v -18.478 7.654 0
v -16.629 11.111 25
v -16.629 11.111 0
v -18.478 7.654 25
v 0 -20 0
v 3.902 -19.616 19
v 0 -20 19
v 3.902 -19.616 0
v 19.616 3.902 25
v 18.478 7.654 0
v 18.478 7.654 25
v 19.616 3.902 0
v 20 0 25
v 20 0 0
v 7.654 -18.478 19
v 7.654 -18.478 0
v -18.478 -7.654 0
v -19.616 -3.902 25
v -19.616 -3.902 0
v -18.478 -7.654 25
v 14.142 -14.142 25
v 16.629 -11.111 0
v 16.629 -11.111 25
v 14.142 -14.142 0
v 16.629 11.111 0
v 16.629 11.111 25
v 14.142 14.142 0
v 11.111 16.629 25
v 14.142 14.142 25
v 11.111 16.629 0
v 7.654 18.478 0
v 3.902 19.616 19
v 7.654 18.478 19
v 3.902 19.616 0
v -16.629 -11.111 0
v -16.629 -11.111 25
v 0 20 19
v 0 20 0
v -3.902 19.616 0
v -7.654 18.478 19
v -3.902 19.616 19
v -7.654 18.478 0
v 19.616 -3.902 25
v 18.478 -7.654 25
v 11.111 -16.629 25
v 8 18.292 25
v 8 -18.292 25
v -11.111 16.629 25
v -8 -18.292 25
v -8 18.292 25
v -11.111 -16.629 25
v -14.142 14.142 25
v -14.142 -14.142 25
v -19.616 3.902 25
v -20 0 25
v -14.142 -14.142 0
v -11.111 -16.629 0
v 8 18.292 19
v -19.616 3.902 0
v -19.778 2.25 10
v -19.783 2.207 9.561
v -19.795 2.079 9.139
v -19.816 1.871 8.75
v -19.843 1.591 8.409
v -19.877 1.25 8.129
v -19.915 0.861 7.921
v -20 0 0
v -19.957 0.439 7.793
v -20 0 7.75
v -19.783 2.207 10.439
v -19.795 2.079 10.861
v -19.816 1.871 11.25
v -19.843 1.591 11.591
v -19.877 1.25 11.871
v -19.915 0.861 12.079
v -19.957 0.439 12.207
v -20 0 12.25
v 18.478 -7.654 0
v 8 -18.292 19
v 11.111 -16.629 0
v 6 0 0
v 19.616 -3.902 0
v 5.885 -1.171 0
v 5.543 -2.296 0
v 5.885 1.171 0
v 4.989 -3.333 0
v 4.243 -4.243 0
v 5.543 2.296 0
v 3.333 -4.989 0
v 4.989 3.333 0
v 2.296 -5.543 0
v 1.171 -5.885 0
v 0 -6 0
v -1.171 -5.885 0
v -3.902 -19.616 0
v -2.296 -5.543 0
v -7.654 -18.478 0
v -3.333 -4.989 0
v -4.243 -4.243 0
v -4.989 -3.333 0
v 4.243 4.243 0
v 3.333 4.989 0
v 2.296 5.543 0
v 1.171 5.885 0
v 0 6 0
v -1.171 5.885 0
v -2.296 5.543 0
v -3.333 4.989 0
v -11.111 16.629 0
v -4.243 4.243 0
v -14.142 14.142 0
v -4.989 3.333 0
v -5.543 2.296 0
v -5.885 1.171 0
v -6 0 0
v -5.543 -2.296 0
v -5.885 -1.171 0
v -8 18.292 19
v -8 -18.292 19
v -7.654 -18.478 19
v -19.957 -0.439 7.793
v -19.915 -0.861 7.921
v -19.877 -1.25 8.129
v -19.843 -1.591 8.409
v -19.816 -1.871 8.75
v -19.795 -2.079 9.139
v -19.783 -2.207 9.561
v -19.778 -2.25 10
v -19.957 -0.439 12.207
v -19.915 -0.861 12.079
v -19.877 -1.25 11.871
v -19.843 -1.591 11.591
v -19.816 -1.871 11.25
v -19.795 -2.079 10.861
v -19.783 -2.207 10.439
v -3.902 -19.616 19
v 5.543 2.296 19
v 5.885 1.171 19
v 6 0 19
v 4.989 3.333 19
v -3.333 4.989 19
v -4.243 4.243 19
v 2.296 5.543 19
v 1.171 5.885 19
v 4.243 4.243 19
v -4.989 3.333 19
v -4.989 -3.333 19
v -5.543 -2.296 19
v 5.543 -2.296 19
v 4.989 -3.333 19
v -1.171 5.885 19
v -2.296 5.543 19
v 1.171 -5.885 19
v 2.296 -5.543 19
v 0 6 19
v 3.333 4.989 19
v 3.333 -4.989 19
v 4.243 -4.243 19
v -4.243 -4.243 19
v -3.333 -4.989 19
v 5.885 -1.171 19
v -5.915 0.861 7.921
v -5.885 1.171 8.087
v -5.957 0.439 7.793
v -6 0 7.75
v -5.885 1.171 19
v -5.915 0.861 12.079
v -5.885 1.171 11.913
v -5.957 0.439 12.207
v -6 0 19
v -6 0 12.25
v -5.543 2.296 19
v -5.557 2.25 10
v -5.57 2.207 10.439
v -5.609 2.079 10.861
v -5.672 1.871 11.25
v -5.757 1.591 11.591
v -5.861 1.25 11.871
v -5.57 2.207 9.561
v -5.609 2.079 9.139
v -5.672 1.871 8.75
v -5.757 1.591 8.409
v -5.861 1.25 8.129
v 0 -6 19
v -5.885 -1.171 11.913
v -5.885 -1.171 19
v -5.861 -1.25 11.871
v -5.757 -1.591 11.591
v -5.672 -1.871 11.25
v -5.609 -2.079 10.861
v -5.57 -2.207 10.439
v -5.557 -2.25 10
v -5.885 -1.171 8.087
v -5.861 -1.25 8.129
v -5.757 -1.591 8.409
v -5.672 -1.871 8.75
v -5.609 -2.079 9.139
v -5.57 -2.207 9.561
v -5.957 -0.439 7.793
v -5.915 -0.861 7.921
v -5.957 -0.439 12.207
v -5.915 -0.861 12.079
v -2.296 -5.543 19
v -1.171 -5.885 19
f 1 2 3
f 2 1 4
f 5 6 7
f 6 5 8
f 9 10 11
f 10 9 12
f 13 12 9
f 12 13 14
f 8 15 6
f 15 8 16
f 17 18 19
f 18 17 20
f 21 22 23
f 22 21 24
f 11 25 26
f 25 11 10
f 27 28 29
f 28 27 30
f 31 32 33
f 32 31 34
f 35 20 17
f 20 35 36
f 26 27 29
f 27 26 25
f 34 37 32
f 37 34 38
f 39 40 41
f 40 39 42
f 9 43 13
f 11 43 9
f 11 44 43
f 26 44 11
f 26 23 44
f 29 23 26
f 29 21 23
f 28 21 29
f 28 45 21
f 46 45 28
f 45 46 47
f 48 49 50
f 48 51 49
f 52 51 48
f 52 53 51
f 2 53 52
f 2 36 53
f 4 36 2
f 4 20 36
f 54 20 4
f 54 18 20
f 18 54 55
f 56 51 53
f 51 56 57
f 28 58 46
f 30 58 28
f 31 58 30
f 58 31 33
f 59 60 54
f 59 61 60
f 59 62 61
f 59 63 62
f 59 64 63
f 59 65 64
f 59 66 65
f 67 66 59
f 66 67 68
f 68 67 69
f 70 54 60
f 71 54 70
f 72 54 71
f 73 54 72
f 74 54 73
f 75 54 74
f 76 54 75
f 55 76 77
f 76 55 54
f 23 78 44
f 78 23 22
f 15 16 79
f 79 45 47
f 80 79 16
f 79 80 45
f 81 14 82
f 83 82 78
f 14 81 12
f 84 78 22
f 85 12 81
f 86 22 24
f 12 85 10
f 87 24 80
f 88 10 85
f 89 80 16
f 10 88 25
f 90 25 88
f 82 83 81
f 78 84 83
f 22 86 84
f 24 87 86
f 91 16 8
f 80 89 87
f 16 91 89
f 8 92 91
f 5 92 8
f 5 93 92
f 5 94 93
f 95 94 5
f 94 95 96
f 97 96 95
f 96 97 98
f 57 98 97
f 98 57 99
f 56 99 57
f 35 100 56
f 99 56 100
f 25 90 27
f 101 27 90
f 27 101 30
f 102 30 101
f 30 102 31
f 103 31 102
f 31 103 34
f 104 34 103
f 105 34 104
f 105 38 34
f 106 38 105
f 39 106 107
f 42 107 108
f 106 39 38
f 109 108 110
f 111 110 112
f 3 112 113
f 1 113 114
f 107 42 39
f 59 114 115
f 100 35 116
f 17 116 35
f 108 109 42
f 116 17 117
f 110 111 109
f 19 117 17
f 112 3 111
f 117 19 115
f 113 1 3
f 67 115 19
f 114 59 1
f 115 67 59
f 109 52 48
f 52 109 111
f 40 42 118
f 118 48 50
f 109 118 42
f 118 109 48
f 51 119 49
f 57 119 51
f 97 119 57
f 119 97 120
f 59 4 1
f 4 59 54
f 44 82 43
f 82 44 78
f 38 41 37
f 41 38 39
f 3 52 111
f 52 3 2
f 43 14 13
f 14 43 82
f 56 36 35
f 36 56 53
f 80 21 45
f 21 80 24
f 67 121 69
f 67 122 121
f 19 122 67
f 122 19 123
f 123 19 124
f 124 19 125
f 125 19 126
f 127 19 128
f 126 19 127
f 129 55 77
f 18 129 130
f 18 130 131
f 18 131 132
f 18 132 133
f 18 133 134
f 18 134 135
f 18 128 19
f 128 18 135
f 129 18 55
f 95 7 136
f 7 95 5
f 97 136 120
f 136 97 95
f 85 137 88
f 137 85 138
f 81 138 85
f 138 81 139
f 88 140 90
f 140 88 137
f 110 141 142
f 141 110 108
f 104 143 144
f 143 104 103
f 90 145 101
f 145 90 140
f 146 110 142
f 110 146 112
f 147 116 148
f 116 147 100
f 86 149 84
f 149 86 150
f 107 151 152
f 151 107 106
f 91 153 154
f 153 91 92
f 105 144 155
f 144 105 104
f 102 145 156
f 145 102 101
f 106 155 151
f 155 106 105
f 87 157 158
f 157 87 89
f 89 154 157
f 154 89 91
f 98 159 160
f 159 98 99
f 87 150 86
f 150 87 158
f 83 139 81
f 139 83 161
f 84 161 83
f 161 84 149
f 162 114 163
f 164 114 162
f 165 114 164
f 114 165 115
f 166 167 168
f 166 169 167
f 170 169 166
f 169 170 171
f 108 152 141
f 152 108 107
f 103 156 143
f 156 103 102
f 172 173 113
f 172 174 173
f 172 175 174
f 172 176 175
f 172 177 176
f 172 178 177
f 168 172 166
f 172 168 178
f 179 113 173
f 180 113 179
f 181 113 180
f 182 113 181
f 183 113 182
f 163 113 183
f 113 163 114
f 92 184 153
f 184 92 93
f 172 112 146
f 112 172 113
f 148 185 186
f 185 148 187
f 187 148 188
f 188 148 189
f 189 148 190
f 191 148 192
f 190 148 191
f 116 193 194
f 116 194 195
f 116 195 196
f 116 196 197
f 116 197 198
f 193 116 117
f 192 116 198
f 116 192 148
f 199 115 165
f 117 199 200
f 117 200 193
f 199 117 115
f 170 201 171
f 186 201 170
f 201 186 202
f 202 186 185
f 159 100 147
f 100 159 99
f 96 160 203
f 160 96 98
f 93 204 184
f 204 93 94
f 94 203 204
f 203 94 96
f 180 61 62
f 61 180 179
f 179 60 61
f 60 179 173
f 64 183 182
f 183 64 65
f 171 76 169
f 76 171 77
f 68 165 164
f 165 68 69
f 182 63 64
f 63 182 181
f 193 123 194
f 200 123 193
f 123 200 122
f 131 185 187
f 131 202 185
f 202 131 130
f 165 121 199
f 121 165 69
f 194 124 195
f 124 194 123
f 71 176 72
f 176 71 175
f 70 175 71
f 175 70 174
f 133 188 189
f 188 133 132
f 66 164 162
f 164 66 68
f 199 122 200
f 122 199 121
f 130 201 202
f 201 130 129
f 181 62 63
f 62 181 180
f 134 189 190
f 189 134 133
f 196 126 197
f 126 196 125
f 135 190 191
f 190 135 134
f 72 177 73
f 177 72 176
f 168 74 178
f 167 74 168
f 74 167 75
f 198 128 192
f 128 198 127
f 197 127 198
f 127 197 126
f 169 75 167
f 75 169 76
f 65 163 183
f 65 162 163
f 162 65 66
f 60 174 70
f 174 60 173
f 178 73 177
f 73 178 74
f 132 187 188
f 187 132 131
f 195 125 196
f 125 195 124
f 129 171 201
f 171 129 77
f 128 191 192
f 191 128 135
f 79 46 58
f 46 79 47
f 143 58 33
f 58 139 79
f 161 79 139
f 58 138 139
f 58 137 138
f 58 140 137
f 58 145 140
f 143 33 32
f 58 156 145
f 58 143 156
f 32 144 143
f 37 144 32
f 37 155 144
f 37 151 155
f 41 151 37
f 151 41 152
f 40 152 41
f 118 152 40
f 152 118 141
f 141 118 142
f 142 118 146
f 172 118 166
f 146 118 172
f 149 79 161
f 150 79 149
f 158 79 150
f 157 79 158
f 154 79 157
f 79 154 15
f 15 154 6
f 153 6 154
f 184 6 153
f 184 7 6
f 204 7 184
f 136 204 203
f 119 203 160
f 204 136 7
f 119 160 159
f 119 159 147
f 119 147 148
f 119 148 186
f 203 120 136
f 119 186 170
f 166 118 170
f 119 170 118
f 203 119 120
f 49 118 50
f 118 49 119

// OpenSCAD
$fn = 32;

// ----------------------------------------------------------------------
// Oldham coupling hub: 40 x 25 mm
// ----------------------------------------------------------------------

// --- parameters (mm) ---
hub_d = 40;               // hub diameter
hub_l = 20;               // hub length
bore_d = 12;              // shaft bore
tongue_w = 16;            // drive tongue width
tongue_h = 5;             // drive tongue height
set_d = 4.5;              // set screw tap hole

module hub() {
  /* the slot side is a raised disc with a groove milled across it */
  cylinder(h = hub_l + tongue_h, d = hub_d);
}

difference() {
  hub();
  translate([0, 0, -1]) cylinder(h = hub_l + tongue_h + 2, d = bore_d);
  translate([-hub_d / 2 - 1, 0, hub_l * 0.5])
    rotate([0, 90, 0]) cylinder(h = hub_d / 2 + 2, d = set_d);
  translate([-tongue_w / 2, -hub_d / 2 - 1, hub_l - 1])
    cube([tongue_w, hub_d + 2, tongue_h + 1]);
}
